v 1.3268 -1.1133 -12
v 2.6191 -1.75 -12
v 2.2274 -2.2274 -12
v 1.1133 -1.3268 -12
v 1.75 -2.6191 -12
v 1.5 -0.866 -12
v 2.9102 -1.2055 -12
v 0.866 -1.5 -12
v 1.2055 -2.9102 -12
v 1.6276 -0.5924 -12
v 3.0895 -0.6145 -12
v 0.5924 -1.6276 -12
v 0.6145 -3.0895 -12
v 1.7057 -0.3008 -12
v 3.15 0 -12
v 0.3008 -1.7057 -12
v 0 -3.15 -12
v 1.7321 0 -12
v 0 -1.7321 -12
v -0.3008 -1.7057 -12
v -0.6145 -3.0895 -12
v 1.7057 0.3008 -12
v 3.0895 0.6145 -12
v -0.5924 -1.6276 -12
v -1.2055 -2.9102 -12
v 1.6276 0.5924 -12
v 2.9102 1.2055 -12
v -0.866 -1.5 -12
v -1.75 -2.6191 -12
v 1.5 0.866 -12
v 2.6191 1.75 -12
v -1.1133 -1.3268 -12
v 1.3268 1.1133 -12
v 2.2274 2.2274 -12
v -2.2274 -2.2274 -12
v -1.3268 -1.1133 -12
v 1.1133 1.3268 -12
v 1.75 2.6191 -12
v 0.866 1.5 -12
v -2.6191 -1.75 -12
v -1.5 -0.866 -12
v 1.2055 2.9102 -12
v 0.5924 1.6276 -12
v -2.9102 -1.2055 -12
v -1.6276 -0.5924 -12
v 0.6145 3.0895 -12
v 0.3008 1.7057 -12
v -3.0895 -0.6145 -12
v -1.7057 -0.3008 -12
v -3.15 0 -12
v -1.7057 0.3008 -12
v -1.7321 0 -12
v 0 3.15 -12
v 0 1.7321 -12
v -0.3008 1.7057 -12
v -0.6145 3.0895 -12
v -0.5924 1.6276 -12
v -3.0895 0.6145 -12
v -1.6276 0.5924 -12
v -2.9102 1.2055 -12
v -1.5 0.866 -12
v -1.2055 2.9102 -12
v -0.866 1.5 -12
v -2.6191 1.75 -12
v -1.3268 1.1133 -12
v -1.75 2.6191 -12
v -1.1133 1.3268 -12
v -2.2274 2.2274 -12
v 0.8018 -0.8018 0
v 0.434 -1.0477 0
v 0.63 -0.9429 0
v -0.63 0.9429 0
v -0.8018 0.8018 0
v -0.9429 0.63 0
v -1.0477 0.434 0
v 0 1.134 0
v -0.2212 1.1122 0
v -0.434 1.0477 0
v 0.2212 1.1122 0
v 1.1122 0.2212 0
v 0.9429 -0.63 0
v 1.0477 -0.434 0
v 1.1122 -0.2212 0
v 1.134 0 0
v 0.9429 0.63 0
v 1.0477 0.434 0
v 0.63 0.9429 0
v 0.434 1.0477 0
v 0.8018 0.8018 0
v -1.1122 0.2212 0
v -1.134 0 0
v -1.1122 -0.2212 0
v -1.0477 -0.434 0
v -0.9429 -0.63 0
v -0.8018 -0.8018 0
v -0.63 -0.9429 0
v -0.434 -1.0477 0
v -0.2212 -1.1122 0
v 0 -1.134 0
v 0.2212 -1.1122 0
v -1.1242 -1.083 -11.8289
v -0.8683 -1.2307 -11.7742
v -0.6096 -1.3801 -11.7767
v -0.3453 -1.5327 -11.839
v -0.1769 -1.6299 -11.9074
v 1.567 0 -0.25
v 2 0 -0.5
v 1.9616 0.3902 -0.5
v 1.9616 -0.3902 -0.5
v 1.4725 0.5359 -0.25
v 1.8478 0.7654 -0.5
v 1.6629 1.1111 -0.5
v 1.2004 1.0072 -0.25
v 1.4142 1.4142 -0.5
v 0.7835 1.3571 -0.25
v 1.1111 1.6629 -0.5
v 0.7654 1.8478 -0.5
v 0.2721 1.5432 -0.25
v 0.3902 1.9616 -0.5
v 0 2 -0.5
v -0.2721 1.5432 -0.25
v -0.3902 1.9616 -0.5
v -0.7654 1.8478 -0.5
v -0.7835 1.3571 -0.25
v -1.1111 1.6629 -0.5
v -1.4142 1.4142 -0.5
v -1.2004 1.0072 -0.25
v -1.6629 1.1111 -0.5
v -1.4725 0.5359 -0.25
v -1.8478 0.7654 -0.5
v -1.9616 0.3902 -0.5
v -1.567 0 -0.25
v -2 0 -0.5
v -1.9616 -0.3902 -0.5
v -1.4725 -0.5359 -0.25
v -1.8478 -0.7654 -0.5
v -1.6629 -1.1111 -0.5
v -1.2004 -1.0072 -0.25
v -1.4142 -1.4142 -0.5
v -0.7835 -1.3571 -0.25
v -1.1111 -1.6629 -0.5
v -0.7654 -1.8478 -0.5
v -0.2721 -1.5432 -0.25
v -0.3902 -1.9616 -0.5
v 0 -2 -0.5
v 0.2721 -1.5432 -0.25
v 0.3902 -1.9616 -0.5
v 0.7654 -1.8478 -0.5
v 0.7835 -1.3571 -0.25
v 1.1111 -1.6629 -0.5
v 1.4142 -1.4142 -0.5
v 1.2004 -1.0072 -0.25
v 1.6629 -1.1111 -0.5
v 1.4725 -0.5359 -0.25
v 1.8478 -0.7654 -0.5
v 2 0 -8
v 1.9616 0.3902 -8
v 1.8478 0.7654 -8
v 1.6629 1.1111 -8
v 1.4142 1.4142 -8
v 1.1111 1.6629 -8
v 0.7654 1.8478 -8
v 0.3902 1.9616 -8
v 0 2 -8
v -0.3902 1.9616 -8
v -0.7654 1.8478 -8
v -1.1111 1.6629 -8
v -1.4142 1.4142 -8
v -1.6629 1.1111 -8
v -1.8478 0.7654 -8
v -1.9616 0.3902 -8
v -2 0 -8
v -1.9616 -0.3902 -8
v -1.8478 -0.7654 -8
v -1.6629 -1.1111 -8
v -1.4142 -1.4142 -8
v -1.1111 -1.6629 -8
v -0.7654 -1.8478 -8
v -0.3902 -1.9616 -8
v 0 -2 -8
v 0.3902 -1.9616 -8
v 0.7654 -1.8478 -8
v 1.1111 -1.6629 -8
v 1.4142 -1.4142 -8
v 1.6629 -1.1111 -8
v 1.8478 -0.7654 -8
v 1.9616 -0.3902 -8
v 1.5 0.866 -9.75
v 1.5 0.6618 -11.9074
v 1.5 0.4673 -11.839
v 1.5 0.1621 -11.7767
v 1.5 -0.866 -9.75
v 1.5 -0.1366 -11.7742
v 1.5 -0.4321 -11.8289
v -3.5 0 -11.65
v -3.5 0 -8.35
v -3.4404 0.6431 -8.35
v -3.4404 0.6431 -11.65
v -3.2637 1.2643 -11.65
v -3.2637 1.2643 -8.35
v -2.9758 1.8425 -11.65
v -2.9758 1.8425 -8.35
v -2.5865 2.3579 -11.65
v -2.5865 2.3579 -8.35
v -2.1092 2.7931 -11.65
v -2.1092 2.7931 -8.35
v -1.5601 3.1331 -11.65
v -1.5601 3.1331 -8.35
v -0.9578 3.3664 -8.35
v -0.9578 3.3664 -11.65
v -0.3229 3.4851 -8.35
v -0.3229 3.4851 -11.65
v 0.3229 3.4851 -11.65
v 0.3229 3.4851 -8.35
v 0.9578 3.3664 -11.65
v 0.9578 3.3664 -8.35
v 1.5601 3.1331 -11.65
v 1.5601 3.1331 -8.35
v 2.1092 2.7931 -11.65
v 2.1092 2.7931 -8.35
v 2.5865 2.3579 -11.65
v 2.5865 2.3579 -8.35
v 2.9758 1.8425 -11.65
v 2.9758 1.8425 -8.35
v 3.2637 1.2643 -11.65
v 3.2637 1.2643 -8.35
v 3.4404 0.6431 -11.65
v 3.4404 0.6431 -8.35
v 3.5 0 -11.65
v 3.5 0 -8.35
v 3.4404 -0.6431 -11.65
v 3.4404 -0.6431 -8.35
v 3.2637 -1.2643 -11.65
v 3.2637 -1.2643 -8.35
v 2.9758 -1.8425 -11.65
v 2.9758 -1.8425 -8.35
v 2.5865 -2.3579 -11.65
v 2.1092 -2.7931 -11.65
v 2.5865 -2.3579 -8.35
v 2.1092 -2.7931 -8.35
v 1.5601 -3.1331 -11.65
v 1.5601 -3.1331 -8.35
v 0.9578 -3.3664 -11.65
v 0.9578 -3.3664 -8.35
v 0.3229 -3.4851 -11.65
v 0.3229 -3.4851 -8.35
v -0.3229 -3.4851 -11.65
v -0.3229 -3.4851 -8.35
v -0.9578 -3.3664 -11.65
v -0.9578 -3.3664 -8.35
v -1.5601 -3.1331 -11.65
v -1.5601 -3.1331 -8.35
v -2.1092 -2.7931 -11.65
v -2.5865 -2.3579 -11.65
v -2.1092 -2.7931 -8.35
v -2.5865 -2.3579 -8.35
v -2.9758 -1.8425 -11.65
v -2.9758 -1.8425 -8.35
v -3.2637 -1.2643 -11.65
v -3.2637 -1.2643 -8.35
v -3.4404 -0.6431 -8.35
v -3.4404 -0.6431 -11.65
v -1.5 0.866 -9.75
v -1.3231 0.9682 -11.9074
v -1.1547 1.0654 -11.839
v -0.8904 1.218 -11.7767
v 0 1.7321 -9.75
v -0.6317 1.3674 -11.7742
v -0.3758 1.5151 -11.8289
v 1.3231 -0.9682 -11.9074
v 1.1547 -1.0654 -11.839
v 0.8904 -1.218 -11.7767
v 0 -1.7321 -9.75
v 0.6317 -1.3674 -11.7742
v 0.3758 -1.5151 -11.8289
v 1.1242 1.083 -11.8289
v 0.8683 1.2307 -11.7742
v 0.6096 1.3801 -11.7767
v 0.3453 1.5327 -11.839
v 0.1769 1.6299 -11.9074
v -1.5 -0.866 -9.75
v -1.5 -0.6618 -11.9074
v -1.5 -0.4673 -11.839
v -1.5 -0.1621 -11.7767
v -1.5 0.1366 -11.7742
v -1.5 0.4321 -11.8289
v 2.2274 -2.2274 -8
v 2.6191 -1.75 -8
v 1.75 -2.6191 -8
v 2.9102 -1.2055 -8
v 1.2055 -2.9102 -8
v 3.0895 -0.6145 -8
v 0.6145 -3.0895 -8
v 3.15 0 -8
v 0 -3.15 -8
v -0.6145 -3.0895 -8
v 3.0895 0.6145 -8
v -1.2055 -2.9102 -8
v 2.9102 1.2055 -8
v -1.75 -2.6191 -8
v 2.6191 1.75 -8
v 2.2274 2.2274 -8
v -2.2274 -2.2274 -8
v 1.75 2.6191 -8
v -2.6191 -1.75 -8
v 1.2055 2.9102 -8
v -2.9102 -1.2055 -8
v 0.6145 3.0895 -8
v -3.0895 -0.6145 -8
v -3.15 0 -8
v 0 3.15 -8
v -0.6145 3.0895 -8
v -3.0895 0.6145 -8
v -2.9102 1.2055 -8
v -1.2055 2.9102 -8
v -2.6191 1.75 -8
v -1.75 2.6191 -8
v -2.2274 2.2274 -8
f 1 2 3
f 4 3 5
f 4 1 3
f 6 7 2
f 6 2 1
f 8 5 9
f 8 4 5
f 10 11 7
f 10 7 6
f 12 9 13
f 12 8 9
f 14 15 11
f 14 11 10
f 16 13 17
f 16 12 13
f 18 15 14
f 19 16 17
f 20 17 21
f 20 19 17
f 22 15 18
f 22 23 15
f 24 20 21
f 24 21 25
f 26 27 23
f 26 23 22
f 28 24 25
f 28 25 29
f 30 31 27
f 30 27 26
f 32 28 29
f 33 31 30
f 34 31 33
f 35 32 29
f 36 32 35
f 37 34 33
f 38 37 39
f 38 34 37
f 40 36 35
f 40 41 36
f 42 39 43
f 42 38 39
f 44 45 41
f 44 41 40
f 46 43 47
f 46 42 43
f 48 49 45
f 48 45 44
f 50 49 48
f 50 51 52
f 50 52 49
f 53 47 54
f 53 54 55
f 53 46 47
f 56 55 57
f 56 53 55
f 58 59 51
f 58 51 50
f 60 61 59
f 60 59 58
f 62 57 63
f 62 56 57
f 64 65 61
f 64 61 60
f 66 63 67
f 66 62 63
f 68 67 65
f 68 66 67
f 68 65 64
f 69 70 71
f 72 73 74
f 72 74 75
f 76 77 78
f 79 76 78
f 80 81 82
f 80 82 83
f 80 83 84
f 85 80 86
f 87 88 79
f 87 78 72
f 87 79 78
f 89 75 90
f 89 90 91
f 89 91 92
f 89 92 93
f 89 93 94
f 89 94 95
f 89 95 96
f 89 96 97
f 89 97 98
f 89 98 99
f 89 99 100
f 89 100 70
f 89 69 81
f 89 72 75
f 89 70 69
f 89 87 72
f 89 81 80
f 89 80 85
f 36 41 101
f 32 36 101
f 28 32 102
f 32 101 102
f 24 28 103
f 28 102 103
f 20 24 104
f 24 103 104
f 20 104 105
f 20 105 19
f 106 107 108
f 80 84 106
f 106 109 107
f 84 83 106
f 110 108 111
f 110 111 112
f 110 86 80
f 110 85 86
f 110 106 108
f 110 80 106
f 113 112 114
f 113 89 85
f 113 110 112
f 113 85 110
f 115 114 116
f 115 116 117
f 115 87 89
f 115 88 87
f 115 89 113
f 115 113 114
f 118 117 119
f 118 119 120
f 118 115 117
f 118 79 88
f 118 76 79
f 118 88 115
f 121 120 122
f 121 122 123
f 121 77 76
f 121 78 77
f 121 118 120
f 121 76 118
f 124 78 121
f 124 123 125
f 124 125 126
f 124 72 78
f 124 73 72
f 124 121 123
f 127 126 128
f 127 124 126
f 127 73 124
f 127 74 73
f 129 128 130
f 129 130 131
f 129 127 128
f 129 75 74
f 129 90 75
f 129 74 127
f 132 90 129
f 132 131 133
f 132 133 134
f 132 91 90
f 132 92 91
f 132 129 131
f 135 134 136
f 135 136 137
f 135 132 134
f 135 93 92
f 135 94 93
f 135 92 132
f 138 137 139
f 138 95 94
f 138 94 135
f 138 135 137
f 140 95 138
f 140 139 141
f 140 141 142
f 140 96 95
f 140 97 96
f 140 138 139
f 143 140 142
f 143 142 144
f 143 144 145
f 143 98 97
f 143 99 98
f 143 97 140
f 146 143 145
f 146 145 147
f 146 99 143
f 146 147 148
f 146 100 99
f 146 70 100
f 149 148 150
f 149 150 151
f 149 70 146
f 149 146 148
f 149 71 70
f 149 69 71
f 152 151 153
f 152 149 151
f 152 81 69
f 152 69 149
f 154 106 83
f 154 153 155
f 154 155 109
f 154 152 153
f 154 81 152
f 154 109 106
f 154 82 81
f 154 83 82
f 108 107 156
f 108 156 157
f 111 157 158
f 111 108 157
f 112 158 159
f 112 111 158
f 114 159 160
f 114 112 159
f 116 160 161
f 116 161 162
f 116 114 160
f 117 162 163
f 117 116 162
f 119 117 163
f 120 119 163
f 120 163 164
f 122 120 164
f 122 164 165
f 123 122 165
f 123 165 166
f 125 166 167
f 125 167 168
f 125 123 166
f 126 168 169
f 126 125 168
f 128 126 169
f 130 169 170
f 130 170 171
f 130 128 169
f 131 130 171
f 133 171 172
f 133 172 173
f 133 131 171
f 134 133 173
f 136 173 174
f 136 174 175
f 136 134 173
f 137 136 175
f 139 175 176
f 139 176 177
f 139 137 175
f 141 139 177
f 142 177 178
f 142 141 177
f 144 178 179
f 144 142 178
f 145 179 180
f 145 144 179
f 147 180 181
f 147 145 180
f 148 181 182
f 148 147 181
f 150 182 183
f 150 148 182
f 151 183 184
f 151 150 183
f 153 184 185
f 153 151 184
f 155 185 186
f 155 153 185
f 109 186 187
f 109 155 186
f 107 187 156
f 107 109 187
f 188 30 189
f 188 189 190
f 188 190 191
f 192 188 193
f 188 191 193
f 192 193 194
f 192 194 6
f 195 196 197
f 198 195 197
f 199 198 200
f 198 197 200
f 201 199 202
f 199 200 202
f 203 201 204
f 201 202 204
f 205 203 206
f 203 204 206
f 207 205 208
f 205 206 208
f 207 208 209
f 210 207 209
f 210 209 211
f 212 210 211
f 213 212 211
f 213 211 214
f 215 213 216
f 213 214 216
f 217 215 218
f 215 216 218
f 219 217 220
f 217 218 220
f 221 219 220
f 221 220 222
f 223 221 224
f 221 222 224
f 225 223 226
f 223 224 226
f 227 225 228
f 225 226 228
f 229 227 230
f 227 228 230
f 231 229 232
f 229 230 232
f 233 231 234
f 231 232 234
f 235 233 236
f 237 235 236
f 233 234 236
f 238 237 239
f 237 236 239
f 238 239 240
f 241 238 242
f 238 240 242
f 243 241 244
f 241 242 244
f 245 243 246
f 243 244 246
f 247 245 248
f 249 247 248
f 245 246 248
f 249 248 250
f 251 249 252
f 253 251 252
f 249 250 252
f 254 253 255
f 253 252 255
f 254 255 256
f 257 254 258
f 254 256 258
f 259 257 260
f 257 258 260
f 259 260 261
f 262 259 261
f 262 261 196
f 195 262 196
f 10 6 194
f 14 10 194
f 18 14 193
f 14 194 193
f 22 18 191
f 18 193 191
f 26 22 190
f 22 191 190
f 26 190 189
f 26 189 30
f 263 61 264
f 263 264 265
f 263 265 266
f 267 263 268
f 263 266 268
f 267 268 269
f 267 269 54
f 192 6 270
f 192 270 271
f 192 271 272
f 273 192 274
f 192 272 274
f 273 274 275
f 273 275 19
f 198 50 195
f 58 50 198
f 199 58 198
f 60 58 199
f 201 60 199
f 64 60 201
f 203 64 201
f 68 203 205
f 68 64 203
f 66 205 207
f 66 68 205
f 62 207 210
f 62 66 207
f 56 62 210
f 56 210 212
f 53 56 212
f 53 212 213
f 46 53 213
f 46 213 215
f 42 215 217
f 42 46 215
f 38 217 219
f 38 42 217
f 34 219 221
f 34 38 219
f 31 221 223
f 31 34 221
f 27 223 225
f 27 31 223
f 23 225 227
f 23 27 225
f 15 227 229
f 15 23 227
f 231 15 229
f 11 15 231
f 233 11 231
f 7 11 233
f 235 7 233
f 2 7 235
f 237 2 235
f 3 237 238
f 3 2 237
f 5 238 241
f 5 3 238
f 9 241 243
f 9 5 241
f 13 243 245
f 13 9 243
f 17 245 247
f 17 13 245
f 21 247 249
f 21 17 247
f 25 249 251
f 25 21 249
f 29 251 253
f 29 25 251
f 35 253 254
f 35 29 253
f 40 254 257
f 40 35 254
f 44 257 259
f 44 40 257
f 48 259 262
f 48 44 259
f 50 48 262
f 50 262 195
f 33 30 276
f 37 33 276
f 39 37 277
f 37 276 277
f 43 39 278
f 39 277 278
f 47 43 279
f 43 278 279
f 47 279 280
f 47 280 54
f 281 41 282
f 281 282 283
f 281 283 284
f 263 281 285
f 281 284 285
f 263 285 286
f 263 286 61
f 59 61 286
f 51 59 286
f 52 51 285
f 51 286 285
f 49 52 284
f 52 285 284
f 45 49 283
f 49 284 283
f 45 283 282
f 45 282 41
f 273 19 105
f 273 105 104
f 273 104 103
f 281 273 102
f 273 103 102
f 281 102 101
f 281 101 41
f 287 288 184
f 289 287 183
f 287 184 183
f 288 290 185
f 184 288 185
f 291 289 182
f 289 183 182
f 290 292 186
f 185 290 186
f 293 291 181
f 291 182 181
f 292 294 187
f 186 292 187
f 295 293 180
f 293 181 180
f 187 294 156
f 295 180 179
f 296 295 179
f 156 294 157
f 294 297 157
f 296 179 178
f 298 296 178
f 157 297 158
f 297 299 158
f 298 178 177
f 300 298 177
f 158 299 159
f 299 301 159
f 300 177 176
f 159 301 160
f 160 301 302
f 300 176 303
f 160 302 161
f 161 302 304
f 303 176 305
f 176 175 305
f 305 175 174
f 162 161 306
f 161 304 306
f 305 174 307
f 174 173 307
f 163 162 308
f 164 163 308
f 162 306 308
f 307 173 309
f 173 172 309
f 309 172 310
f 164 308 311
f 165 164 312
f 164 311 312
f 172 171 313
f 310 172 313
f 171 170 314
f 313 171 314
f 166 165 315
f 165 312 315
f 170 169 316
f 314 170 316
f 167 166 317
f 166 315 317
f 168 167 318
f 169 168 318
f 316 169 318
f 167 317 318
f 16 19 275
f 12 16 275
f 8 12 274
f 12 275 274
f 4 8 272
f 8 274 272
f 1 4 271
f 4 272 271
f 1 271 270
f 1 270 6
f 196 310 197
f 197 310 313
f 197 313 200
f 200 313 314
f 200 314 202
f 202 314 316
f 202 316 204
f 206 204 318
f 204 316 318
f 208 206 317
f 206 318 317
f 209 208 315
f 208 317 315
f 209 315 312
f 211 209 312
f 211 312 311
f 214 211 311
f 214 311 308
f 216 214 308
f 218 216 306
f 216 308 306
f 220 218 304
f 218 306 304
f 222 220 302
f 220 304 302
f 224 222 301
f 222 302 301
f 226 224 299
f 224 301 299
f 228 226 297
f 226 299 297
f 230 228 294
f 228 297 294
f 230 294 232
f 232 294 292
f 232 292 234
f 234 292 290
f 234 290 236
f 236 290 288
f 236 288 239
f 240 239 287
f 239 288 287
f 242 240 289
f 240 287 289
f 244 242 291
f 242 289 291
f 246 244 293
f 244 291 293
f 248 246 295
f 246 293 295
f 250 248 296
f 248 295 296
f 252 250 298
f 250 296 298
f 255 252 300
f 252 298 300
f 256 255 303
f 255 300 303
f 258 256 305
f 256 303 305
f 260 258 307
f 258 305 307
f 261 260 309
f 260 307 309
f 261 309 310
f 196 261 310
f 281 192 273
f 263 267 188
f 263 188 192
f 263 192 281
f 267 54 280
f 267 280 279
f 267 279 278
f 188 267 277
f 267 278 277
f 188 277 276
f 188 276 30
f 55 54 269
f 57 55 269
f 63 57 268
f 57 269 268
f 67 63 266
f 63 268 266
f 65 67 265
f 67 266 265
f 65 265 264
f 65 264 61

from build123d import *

# Parameters (mm, degrees)
SKETCH1_R           = 2
EXTRUDE1_DEPTH      = 8
CUT_SWEEP1_PITCH    = 0.7
SKETCH6_R           = 3.5
EXTRUDE2_DEPTH      = 4
CUT_EXTRUDE1_DEPTH  = 2.25
CHAMFER1_SIZE       = 0.35
SKETCH10_R          = 2
BOSS_EXTRUDE1_DEPTH = 8
CHAMFER2_SIZE       = 0.5
CHAMFER2_SIZE2      = 0.866025404


with BuildPart() as part:
    # Sketch1 → Extrude1 (new body)
    with BuildSketch(Plane.XY):
        Circle(SKETCH1_R)
    extrude(amount=-EXTRUDE1_DEPTH)

    # Cut-Sweep1: the profile of Sketch3 profile screwed along a right-hand helix of 12.428571 turns, 6 arcs to a turn; built about Z, then put on its axis
    cut_sweep1_z = Axis((0, 0, 0), (0, 0, 1))
    cut_sweep1_corners = [(2.0003, 0, -0.612673205), (1.545336663, 0, -0.35), (1.545336663, 0, -0.2625), (2.0003, 0, 0.000173205)]
    with BuildLine(mode=Mode.PRIVATE) as cut_sweep1_profile:
        Line(cut_sweep1_corners[0], cut_sweep1_corners[1])
        Line(cut_sweep1_corners[1], cut_sweep1_corners[2])
        Line(cut_sweep1_corners[2], cut_sweep1_corners[3])
        Line(cut_sweep1_corners[3], cut_sweep1_corners[0])
    cut_sweep1_cap = Face(cut_sweep1_profile.wire())
    cut_sweep1_turn_angles = [0, 30, 60, 90, 120, 150, 180, 210, 240, 270, 300, 330, 360]
    cut_sweep1_turn_weights = [1, 0.8660254037844387, 1, 0.8660254037844387, 1, 0.8660254037844387, 1, 0.8660254037844387, 1, 0.8660254037844387, 1, 0.8660254037844387, 1]
    cut_sweep1_turn_rails = [Edge.make_bspline([Vector(p[0], p[1], 0).rotate(cut_sweep1_z, cut_sweep1_turn_angles[k]) / cut_sweep1_turn_weights[k] + Vector(0, 0, p[2] + CUT_SWEEP1_PITCH * cut_sweep1_turn_angles[k] / 360) for k in range(13)], [0, 0, 0, 1, 1, 2, 2, 3, 3, 4, 4, 5, 5, 6, 6, 6], 2, cut_sweep1_turn_weights) for p in cut_sweep1_corners]
    cut_sweep1_turn_sides = [Face.make_surface_from_curves(cut_sweep1_turn_rails[p[0]], cut_sweep1_turn_rails[p[1]]) for p in [(0, 1), (1, 2), (2, 3), (3, 0)]]
    cut_sweep1_last_angles = [4320, 4350, 4380, 4410, 4440, 4457.142857143, 4474.285714286]
    cut_sweep1_last_weights = [1, 0.8660254037844387, 1, 0.8660254037844387, 1, 0.9555728057861561, 1]
    cut_sweep1_last_rails = [Edge.make_bspline([Vector(p[0], p[1], 0).rotate(cut_sweep1_z, cut_sweep1_last_angles[k]) / cut_sweep1_last_weights[k] + Vector(0, 0, p[2] + CUT_SWEEP1_PITCH * cut_sweep1_last_angles[k] / 360) for k in range(7)], [0, 0, 0, 1, 1, 2, 2, 3, 3, 3], 2, cut_sweep1_last_weights) for p in cut_sweep1_corners]
    cut_sweep1_last_sides = [Face.make_surface_from_curves(cut_sweep1_last_rails[p[0]], cut_sweep1_last_rails[p[1]]) for p in [(0, 1), (1, 2), (2, 3), (3, 0)]]
    cut_sweep1 = Plane(origin=(0, 0, 0), x_dir=(0, 1, 0), z_dir=(0, 0, -1)) * Solid(Shell([*[p.moved(Location((0, 0, CUT_SWEEP1_PITCH * i))) for i in range(12) for p in cut_sweep1_turn_sides], *cut_sweep1_last_sides, cut_sweep1_cap, cut_sweep1_cap.rotate(cut_sweep1_z, 4474.285714286).moved(Location((0, 0, CUT_SWEEP1_PITCH * 4474.285714286 / 360)))]))
    add(cut_sweep1, mode=Mode.SUBTRACT)

    # Sketch4 → Cut-Revolve1 (revolve, cut)
    with BuildSketch(Plane(origin=(0, 0, 0), x_dir=(0, 0, -1), z_dir=(1, 0, 0)), mode=Mode.PRIVATE) as cut_revolve1_sk:
        Polygon((0.496211411, 2), (0, 1.291336663), (0, 2), align=None)
    revolve(cut_revolve1_sk.sketch.rotate(Axis((0, 0, 0), (0, 0, -1)), 271.401126896), axis=Axis((0, 0, 0), (0, 0, -1)), mode=Mode.SUBTRACT)

    # Sketch6 → Extrude2 (add)
    with BuildSketch(Plane(origin=(0, 0, -8), x_dir=(-1, 0, 0), z_dir=(0, 0, -1))):
        Circle(SKETCH6_R)
    extrude(amount=EXTRUDE2_DEPTH)

    # Sketch7 → Cut-Extrude1 (cut)
    with BuildSketch(Plane(origin=(0, 0, -12), x_dir=(-1, 0, 0), z_dir=(0, 0, -1))):
        Polygon((0, 1.732050808), (-1.5, 0.866025404), (-1.5, -0.866025404), (0, -1.732050808), (1.5, -0.866025404), (1.5, 0.866025404), align=None)
    extrude(amount=-CUT_EXTRUDE1_DEPTH, mode=Mode.SUBTRACT)

    # Cut-Extrude2 cone 1 section (through the dimple's axis) → Cut-Extrude2 (revolve, cut)
    with BuildSketch(Plane(origin=(0, 0, -12), x_dir=(0, 1, 0), z_dir=(1, 0, 0))):
        Polygon((0, 0), (1.732050808, 0), (0, 1.732050808), align=None)
    revolve(axis=Axis((0, 0, -12), (0, 0, 1)), mode=Mode.SUBTRACT)

    # Chamfer1
    chamfer1_edges = [part.edges().sort_by_distance(p)[0] for p in [
        (3.5, 0, -8),
        (3.5, 0, -12),
    ]]
    chamfer(chamfer1_edges, length=CHAMFER1_SIZE)

    # Sketch10 → Boss-Extrude1 (add)
    with BuildSketch(Plane.XY):
        Circle(SKETCH10_R)
    extrude(amount=-BOSS_EXTRUDE1_DEPTH)

    # Chamfer2
    chamfer2_edges = [part.edges().sort_by_distance(p)[0] for p in [
        (-2, 0, 0),
    ]]
    chamfer2_side = [part.faces().sort_by_distance(p)[0] for p in [
        (-2, 0, -4),
    ]]
    chamfer(chamfer2_edges, length=CHAMFER2_SIZE, length2=CHAMFER2_SIZE2, reference=chamfer2_side[0])


solid = part.part
